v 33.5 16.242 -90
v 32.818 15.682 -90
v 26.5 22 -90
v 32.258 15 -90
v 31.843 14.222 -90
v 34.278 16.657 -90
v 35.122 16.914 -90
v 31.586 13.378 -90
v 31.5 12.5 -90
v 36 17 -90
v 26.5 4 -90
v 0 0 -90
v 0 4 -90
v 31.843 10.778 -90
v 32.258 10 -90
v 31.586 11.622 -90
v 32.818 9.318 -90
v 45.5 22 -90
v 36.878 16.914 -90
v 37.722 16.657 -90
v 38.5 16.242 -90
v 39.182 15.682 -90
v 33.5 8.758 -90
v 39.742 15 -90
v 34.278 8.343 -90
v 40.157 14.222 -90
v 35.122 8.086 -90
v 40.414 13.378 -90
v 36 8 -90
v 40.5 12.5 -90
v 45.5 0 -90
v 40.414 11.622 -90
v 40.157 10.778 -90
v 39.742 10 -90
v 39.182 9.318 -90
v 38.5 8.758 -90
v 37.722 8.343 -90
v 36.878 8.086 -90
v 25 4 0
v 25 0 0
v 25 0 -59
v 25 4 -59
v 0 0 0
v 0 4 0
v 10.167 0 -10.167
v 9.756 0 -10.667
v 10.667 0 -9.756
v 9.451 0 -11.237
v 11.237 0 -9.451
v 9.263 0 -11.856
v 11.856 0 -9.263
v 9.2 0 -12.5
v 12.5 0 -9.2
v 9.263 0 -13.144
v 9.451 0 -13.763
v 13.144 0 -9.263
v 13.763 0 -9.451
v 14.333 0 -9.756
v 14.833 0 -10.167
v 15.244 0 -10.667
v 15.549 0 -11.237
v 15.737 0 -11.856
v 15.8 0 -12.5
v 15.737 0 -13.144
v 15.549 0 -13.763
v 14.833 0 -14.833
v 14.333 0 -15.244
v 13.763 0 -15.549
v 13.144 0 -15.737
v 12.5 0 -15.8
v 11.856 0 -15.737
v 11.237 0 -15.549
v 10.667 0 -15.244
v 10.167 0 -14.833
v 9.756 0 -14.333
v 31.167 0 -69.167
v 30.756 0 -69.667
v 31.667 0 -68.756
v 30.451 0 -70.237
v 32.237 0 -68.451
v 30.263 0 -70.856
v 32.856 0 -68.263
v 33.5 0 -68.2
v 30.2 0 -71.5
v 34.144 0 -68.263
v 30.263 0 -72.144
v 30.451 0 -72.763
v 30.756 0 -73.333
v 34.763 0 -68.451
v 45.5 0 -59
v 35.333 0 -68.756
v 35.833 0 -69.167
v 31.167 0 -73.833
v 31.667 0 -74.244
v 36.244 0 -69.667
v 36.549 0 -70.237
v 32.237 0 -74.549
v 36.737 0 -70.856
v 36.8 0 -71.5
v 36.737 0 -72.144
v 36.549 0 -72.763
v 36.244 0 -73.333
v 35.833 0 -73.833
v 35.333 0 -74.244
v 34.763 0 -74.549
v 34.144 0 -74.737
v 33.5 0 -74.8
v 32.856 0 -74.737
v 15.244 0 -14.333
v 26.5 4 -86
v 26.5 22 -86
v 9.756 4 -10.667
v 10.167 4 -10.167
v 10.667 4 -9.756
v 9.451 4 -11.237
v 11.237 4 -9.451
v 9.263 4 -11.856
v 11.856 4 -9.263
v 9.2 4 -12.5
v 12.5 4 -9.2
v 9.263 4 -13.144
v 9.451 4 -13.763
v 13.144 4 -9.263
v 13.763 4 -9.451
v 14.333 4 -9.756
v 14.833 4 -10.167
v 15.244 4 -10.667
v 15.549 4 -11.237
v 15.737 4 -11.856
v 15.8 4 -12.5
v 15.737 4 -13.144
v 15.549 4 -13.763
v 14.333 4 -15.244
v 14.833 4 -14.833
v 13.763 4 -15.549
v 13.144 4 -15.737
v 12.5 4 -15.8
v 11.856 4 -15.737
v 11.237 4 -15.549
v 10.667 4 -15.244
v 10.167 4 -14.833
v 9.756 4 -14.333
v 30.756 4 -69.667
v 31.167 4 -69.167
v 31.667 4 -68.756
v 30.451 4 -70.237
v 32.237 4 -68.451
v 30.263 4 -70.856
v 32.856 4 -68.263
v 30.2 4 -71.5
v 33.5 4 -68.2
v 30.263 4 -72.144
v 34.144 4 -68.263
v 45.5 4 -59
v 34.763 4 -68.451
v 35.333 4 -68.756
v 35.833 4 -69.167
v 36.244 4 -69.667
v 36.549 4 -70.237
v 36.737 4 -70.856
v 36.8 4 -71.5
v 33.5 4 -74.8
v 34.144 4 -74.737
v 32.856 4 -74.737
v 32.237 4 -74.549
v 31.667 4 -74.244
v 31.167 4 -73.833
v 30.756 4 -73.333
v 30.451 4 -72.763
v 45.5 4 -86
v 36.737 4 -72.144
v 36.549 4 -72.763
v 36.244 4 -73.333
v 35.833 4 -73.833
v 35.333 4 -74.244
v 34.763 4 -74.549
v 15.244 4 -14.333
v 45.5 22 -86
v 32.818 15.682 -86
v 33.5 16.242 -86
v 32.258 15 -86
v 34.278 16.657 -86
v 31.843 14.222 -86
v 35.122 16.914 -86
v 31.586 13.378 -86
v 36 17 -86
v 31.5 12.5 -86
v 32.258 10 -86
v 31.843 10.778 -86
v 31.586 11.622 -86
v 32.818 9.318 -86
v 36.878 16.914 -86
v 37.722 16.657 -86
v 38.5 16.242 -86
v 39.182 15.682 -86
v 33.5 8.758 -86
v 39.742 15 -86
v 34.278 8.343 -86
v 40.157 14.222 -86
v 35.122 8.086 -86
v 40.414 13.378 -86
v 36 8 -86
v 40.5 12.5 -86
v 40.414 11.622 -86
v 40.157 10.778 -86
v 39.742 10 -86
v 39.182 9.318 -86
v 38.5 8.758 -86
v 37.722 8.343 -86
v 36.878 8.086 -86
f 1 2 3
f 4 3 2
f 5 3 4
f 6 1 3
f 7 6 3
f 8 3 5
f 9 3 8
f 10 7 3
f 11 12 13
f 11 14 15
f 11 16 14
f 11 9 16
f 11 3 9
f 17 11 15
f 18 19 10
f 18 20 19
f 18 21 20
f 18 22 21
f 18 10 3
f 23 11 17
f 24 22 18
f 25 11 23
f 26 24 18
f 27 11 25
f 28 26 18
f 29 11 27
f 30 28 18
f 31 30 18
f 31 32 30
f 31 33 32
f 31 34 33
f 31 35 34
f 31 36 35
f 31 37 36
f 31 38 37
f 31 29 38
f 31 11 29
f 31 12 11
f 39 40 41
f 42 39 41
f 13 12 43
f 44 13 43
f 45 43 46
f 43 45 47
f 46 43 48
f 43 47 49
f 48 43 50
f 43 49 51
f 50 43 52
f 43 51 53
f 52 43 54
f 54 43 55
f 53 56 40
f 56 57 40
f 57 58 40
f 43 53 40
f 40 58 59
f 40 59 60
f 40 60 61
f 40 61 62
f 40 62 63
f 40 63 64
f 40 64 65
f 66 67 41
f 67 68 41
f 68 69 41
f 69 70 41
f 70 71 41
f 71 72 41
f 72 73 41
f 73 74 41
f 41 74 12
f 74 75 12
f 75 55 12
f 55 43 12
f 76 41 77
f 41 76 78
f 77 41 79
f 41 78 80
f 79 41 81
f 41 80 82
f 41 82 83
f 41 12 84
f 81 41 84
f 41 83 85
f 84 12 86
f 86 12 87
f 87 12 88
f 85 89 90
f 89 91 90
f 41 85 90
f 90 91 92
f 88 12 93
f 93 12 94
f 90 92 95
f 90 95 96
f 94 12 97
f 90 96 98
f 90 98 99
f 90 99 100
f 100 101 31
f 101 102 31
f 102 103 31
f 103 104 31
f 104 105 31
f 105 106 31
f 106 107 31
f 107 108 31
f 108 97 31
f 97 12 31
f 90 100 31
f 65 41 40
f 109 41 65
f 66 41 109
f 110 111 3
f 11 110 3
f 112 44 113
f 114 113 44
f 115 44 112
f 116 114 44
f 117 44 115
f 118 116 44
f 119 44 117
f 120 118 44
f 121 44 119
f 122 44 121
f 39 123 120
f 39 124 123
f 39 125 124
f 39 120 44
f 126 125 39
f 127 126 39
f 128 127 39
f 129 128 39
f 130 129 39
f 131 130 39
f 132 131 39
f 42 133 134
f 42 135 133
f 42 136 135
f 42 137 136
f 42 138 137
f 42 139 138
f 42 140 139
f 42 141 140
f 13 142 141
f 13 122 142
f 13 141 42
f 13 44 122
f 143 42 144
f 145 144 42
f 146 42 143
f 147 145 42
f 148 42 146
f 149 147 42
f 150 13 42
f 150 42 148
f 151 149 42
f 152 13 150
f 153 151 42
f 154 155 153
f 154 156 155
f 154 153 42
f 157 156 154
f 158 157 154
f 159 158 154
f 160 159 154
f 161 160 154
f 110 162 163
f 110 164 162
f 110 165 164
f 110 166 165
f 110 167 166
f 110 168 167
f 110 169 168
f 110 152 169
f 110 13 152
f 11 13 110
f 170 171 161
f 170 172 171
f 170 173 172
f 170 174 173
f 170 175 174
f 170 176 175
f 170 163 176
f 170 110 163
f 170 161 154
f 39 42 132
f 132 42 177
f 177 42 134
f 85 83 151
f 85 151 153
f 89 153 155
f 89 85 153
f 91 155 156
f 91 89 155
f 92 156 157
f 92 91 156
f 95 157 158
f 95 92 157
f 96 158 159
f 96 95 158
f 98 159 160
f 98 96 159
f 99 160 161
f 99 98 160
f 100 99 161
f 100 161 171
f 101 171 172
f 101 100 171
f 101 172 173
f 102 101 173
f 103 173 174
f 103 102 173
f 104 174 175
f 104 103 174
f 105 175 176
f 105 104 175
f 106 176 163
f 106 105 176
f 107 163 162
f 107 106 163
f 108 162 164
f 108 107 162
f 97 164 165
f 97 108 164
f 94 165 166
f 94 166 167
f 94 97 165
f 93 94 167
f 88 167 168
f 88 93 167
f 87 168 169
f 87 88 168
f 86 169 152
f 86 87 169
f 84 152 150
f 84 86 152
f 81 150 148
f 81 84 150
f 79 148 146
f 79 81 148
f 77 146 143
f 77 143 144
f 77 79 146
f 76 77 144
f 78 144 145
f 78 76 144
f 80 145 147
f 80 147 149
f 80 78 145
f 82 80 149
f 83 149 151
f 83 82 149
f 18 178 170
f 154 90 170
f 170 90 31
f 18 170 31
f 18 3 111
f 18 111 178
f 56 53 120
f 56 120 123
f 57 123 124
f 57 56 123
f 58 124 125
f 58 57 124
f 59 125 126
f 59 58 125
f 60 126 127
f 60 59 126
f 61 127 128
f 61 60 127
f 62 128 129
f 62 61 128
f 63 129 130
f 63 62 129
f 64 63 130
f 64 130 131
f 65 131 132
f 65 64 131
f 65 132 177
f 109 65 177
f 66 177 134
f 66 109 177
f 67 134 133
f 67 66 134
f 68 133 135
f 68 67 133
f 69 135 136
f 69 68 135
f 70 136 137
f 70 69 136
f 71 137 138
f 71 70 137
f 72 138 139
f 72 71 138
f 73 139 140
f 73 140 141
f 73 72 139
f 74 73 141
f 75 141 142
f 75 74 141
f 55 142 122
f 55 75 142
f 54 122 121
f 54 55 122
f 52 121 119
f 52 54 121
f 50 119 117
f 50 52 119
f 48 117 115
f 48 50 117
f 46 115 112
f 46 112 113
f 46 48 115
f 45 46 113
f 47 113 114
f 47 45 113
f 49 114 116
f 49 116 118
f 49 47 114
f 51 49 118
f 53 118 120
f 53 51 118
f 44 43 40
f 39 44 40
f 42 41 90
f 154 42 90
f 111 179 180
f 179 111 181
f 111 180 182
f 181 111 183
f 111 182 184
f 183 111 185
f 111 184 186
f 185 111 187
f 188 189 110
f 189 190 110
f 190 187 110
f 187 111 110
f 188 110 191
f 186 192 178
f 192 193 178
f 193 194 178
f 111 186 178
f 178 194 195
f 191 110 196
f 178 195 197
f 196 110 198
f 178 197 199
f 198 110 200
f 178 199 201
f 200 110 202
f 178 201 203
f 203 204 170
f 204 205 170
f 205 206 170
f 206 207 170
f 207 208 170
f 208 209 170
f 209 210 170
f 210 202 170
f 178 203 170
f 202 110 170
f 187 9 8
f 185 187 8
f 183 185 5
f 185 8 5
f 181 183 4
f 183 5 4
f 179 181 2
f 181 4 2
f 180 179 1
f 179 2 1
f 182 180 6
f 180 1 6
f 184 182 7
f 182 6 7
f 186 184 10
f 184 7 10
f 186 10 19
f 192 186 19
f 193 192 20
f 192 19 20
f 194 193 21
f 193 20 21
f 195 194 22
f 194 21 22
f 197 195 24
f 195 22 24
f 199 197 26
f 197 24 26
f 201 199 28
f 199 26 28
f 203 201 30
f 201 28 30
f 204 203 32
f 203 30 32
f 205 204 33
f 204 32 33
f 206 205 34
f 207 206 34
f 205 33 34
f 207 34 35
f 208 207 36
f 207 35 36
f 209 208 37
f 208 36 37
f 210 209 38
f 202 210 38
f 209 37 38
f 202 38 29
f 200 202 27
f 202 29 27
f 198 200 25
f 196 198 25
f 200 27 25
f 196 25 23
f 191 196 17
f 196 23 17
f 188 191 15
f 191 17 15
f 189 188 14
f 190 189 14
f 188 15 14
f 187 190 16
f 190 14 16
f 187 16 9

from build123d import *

# Parameters (mm, degrees)
SKETCH1_R           = 3.3
BOSS_EXTRUDE1_DEPTH = 4
SKETCH2_W           = 19
SKETCH2_H           = 4
BOSS_EXTRUDE2_DEPTH = 18
SKETCH3_R           = 4.5
CUT_EXTRUDE1_DEPTH  = 4


with BuildPart() as part:
    # Sketch1 → Boss-Extrude1 (new body)
    with BuildSketch(Plane(origin=(0, 0, 0), x_dir=(1, 0, 0), z_dir=(0, 1, 0))):
        Polygon((0, 0), (25, 0), (25, 59), (45.5, 59), (45.5, 90), (0, 90), align=None)
        with Locations(Location((33.5, 71.5, 0), (0, 0, 270))):
            Circle(SKETCH1_R, mode=Mode.SUBTRACT)
        with Locations(Location((12.5, 12.5, 0), (0, 0, 270))):
            Circle(SKETCH1_R, mode=Mode.SUBTRACT)
    extrude(amount=BOSS_EXTRUDE1_DEPTH)

    # Sketch2 → Boss-Extrude2 (add)
    with BuildSketch(Plane(origin=(0, 4, 0), x_dir=(1, 0, 0), z_dir=(0, 1, 0))):
        with Locations((36, 88)):
            Rectangle(SKETCH2_W, SKETCH2_H)
    extrude(amount=BOSS_EXTRUDE2_DEPTH)

    # Sketch3 → Cut-Extrude1 (cut)
    with BuildSketch(Plane(origin=(0, 0, -90), x_dir=(-1, 0, 0), z_dir=(0, 0, -1))):
        with Locations((-36, 12.5)):
            Circle(SKETCH3_R)
    extrude(amount=-CUT_EXTRUDE1_DEPTH, mode=Mode.SUBTRACT)


solid = part.part
